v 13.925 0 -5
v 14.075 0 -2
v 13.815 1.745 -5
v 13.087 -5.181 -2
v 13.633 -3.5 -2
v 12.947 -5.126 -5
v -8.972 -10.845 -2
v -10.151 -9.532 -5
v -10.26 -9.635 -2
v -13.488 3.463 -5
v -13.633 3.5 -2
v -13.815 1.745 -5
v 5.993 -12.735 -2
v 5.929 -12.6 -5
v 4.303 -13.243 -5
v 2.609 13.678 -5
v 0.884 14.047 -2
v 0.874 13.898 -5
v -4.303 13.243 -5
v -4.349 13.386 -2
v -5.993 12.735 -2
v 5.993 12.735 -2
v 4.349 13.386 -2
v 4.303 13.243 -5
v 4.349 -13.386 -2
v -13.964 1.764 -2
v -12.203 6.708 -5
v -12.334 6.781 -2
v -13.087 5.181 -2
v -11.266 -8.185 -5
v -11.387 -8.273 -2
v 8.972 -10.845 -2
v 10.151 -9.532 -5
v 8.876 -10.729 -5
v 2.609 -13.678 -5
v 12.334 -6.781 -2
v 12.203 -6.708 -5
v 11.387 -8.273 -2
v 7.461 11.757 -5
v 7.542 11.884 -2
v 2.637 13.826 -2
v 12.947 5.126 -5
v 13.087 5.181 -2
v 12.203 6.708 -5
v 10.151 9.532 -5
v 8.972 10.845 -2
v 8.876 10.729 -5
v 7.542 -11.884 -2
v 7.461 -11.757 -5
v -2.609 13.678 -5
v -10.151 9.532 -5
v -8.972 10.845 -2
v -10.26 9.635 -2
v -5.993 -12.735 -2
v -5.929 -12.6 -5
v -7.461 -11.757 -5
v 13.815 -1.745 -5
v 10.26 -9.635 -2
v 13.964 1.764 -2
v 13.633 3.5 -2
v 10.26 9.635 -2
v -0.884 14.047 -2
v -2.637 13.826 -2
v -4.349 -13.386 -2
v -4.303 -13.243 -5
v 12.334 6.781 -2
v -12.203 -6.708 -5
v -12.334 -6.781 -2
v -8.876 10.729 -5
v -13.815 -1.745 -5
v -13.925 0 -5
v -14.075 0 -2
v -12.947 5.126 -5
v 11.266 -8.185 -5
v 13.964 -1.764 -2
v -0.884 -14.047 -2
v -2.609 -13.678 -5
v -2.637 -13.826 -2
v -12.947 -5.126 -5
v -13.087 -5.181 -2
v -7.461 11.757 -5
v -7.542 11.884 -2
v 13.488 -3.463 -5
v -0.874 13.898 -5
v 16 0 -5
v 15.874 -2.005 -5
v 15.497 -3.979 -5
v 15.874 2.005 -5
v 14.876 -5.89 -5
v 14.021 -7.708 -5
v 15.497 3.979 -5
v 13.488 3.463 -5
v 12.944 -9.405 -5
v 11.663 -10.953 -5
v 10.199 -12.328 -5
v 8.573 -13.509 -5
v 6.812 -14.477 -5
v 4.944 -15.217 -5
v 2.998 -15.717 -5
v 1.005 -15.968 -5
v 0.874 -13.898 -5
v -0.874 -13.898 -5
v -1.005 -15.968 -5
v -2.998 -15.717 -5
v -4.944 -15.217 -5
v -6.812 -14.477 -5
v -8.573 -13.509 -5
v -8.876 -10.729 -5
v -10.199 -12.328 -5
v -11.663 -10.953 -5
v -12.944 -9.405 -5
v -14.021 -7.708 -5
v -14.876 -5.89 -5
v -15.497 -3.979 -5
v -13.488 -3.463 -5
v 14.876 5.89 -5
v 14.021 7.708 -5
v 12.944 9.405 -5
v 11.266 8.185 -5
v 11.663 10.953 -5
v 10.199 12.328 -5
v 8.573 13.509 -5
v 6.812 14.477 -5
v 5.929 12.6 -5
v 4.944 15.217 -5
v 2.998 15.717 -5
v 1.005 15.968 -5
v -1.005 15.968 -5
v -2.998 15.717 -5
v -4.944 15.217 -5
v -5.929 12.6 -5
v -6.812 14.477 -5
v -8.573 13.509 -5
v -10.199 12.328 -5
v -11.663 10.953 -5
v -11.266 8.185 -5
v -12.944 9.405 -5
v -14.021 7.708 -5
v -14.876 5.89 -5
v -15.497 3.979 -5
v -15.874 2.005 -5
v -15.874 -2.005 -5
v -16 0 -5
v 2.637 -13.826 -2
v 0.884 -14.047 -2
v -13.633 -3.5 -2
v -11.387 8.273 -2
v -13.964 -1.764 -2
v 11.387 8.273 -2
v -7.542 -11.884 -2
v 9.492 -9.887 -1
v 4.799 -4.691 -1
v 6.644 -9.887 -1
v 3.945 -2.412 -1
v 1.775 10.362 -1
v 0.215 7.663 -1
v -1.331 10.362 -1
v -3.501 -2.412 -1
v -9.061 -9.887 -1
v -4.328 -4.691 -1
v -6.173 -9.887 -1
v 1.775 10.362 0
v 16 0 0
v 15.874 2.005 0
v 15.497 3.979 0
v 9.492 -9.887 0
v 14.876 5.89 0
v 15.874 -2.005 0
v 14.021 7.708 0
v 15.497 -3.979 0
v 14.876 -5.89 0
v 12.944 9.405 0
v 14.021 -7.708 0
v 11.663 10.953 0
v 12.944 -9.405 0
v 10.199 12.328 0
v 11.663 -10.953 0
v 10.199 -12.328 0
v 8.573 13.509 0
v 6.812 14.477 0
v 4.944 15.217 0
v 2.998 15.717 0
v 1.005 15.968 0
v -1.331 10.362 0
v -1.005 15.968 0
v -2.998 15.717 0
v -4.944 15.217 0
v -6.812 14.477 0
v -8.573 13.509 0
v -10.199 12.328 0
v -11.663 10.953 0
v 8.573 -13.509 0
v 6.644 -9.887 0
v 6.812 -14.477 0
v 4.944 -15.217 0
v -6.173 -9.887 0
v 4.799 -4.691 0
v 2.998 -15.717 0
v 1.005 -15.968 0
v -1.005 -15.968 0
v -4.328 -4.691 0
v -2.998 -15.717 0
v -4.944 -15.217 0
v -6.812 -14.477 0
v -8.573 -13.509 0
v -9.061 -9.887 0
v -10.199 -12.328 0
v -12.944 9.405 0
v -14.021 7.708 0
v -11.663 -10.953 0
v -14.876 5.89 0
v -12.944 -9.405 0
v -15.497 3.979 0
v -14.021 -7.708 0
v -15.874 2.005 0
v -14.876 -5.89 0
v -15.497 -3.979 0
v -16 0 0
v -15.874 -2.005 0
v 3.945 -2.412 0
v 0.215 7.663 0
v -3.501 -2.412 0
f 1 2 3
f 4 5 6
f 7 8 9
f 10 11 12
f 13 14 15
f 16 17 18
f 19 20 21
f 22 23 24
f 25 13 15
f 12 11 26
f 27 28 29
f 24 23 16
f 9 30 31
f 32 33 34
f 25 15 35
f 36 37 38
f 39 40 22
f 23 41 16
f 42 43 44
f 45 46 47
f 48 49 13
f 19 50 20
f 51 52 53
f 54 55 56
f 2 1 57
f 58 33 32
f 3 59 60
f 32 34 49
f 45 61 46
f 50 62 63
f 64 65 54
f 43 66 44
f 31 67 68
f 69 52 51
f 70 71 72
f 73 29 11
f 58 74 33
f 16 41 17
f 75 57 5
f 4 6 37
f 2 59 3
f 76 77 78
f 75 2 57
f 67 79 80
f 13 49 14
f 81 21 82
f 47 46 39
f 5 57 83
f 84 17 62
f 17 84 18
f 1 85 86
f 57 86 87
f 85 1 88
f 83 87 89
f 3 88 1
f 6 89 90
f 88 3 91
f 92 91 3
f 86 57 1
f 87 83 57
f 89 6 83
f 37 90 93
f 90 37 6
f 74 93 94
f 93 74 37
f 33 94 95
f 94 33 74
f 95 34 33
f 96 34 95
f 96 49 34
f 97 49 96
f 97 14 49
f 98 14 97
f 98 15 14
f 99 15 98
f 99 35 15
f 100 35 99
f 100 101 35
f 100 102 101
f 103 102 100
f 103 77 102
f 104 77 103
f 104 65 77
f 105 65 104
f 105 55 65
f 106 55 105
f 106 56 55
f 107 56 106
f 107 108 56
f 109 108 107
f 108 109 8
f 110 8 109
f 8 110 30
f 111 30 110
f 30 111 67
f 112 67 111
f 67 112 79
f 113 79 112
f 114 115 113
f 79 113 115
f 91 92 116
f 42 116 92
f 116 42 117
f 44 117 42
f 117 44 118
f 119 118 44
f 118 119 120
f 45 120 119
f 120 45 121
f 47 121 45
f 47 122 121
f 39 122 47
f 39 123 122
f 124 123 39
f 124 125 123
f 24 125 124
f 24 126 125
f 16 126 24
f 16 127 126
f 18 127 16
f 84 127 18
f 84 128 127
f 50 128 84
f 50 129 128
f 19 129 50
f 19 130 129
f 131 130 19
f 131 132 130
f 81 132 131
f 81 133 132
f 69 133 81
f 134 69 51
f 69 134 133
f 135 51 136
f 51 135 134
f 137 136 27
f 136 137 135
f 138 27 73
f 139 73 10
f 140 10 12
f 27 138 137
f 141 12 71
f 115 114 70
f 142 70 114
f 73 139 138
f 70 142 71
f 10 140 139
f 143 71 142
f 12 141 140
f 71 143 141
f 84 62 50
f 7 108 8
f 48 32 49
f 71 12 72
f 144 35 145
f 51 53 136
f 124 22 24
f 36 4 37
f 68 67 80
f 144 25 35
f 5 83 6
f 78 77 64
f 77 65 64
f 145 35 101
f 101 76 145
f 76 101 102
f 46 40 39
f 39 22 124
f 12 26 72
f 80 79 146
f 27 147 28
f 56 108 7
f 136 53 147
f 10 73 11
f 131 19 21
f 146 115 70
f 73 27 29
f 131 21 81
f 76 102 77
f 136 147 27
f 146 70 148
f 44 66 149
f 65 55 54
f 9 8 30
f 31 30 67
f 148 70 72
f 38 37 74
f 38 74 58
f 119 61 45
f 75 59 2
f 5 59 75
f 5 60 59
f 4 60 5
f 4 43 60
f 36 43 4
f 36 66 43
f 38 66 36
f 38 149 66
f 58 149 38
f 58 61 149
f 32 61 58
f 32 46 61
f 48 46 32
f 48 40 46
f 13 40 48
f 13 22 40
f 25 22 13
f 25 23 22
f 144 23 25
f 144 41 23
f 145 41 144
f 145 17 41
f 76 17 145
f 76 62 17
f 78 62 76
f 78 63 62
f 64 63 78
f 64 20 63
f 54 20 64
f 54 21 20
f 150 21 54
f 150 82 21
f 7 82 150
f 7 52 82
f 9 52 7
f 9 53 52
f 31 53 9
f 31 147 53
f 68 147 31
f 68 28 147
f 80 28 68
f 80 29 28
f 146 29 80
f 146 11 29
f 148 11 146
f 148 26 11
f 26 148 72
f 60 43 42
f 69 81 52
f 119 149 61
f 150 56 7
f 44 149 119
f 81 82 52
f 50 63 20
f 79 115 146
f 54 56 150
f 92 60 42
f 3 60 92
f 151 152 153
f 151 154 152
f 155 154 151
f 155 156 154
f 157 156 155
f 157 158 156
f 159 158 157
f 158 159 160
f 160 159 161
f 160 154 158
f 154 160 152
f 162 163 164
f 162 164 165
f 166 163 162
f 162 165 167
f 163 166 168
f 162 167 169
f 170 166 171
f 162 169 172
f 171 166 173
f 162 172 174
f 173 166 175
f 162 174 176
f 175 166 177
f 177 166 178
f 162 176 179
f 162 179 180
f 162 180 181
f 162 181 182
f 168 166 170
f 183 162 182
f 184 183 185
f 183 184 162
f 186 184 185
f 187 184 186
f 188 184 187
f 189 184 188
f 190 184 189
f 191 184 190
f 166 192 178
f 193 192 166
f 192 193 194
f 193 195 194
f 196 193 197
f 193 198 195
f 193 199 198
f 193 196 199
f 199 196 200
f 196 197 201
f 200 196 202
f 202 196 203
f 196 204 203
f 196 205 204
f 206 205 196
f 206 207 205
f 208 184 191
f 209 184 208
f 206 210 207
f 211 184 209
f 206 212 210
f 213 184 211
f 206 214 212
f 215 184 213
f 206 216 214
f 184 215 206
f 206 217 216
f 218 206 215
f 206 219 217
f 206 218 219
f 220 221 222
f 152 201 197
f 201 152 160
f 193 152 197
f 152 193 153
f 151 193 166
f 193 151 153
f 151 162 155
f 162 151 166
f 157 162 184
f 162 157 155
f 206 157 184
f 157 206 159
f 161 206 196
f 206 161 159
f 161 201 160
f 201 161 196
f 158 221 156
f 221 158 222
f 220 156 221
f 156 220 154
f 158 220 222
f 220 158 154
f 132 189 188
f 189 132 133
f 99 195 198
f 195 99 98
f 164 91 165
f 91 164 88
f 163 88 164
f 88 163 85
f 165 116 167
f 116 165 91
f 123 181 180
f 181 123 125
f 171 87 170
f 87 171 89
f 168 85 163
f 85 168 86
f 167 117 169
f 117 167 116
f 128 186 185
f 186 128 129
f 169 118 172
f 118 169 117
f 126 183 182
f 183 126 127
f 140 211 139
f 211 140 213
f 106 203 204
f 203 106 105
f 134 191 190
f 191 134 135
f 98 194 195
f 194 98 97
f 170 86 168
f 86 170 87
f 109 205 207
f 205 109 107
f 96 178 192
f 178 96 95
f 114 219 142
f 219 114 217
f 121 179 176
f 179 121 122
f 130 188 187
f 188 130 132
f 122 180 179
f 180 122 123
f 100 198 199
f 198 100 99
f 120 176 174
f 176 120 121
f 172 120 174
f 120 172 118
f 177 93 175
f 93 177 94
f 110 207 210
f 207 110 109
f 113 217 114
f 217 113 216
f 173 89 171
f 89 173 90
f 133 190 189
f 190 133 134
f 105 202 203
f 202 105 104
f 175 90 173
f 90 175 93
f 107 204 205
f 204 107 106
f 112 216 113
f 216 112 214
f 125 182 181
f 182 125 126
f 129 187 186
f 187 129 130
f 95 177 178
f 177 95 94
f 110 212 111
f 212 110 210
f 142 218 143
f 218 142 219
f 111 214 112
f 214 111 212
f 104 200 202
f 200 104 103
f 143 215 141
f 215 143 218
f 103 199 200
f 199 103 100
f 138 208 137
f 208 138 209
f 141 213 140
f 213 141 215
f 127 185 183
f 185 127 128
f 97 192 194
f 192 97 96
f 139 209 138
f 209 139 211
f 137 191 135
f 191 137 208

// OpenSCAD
$fn = 50;


difference() {
	union() {
		translate(v = [0, 0, -5.0000000000]) {
			cylinder(h = 5, r = 16.0000000000);
		}
	}
	union() {
		#translate(v = [0, 0, -5.0000000000]) {
			cylinder(h = 3, r1 = 13.9250000000, r2 = 14.0750000000);
		}
		translate(v = [0, 0, -1]) {
			linear_extrude(height = 1) {
				text(font = "Impact", halign = "center", size = 20, text = "A", valign = "center");
			}
		}
	}
}
